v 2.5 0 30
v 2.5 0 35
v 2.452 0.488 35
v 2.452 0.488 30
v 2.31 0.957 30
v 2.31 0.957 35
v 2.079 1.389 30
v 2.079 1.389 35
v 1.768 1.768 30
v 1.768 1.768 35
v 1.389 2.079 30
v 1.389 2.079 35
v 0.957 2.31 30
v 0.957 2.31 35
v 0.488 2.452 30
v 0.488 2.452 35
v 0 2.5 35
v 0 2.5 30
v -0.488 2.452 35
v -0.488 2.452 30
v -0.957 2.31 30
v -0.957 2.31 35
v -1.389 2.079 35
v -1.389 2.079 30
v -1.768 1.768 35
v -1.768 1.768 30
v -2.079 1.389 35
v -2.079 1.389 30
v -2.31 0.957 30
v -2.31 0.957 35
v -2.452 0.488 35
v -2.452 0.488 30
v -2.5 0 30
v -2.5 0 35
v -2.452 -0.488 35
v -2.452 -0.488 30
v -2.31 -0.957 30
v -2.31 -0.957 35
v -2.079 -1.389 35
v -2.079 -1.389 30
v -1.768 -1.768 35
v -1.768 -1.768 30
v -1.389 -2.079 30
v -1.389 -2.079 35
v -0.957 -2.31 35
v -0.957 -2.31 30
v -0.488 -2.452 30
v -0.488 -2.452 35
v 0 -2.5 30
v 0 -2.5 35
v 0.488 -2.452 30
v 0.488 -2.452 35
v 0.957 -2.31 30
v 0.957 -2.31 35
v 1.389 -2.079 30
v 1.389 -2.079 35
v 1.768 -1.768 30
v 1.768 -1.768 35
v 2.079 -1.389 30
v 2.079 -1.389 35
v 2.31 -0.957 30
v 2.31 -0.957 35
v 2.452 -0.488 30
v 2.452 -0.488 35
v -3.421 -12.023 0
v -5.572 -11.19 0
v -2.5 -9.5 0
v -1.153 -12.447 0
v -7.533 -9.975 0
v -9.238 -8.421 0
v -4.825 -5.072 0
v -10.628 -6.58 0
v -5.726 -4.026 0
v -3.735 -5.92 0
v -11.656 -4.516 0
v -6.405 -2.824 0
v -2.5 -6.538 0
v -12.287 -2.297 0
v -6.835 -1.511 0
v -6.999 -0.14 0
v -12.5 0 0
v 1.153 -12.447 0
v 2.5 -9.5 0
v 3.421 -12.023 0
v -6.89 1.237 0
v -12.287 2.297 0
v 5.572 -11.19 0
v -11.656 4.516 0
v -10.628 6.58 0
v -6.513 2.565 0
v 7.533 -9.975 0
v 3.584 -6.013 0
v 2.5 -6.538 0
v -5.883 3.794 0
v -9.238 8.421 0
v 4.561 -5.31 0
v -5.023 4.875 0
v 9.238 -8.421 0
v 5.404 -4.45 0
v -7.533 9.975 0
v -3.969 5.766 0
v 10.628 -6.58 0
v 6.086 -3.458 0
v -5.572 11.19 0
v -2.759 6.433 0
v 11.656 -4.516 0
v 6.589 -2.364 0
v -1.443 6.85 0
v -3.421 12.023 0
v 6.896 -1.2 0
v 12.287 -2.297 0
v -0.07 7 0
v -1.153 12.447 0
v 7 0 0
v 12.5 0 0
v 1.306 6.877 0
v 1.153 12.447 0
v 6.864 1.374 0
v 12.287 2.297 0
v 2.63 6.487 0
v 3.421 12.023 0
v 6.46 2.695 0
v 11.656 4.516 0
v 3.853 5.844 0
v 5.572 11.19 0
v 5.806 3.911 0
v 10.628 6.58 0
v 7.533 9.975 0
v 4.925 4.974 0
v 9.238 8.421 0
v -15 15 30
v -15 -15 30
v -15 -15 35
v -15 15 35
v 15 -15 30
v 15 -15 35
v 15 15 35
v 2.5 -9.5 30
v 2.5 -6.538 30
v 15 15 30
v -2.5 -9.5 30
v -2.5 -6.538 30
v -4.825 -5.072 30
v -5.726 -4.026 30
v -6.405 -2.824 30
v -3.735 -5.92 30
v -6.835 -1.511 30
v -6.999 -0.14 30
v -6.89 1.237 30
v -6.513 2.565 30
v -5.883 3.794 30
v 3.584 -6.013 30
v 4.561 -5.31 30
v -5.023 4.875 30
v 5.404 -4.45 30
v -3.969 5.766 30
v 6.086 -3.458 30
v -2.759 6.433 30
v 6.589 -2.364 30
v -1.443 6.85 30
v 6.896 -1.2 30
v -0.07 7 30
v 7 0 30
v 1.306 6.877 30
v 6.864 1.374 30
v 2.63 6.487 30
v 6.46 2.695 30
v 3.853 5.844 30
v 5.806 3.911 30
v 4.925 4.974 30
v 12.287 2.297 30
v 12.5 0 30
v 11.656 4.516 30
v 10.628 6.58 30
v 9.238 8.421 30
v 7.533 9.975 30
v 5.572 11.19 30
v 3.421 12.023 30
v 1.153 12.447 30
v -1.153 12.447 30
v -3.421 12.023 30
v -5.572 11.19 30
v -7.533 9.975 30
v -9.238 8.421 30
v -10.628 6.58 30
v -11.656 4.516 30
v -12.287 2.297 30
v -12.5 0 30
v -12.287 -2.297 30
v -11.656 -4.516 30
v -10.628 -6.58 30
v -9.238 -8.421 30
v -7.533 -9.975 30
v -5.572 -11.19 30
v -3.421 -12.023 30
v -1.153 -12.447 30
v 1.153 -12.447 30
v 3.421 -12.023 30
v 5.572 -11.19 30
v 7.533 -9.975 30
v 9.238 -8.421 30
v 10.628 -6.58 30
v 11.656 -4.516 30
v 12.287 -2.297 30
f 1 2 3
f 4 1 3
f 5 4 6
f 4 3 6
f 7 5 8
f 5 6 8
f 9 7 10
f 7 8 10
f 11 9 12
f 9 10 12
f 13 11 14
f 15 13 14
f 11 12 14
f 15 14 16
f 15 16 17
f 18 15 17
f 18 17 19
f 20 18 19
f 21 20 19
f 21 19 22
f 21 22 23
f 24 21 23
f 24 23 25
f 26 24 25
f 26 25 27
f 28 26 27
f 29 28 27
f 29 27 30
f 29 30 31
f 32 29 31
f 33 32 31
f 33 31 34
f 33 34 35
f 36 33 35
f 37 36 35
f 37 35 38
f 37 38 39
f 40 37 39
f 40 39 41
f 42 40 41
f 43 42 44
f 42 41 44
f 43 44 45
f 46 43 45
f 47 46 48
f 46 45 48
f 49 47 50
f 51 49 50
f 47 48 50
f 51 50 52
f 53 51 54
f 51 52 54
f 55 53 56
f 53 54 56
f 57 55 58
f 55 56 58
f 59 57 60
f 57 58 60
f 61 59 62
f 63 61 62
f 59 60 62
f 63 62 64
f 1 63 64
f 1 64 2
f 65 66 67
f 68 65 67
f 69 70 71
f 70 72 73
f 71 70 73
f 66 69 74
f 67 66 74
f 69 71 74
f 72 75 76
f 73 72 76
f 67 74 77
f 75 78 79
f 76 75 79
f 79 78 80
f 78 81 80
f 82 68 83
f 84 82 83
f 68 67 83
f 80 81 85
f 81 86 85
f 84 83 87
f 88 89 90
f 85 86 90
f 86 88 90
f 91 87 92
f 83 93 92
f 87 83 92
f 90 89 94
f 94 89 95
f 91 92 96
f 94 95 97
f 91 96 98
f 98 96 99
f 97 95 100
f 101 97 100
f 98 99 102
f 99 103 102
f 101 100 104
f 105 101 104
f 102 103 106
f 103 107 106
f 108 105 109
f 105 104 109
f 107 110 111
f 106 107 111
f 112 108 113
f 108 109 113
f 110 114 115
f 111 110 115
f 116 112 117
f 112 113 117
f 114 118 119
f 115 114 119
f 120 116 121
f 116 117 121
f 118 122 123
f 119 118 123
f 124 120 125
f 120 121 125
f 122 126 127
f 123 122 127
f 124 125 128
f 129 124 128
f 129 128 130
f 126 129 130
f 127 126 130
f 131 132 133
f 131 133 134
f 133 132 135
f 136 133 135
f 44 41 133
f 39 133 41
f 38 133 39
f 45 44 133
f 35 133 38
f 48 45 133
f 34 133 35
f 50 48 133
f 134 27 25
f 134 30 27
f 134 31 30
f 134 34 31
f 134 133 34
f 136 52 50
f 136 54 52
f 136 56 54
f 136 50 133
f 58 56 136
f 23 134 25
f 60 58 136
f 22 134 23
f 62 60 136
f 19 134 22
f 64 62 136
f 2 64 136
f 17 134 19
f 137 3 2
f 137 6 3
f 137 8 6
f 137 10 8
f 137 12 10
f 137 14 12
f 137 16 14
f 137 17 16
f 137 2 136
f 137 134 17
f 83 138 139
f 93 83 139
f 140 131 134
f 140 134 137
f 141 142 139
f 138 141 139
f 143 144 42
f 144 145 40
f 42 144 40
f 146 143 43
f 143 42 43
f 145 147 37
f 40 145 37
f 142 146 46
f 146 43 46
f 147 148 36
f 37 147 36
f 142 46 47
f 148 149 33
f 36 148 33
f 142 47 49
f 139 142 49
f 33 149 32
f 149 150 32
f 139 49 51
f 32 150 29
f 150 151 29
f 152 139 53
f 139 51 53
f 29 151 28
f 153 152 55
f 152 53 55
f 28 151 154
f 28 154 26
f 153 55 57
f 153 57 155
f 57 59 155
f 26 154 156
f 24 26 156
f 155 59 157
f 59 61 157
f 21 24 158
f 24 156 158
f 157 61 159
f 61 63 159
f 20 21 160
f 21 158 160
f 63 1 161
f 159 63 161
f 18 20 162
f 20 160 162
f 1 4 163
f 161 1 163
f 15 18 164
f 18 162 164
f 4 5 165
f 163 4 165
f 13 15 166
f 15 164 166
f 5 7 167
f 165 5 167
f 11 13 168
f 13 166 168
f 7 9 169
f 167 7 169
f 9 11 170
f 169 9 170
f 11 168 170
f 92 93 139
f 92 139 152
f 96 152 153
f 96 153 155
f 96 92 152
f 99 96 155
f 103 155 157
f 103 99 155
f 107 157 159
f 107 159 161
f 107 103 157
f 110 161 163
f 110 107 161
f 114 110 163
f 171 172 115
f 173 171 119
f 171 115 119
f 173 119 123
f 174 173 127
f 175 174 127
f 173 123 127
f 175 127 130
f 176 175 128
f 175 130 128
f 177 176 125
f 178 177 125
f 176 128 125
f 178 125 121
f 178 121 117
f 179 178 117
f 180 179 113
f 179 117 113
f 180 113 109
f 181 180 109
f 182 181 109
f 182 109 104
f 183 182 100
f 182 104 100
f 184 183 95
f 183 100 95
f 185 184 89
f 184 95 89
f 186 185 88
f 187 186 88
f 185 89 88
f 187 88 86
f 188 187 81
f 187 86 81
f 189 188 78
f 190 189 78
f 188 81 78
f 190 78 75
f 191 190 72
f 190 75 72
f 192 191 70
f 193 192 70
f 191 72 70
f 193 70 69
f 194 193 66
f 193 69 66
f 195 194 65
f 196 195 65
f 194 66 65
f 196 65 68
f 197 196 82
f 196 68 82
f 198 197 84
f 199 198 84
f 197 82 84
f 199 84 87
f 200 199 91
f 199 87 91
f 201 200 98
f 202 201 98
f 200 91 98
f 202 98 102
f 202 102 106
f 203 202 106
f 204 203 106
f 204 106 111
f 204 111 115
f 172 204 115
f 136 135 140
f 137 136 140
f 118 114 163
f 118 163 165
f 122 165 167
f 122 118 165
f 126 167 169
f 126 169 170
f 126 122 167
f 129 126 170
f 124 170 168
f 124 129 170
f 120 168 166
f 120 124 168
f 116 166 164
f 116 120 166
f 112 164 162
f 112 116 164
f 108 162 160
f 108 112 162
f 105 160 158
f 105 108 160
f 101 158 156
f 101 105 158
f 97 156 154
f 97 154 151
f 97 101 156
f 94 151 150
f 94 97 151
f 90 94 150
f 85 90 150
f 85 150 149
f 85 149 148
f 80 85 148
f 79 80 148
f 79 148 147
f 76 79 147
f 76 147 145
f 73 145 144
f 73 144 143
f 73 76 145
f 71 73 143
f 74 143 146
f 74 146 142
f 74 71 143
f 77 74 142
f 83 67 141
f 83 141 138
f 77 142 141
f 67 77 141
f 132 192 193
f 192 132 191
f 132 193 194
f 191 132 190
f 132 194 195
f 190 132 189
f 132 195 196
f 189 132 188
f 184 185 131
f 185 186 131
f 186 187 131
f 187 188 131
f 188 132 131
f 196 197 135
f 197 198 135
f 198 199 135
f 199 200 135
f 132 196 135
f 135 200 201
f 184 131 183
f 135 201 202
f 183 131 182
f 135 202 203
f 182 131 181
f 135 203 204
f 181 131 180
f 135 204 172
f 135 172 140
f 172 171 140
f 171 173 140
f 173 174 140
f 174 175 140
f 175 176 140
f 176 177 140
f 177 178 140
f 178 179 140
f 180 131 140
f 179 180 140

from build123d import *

# Parameters (mm, degrees)
F0_W     = 30
F0_H     = 30
F1_DEPTH = 35
F2_DEPTH = 30
F3_R     = 2.5
F4_DEPTH = 35.001
F5_W     = 30
F5_H     = 30
F5_R     = 12.5
F6_DEPTH = 30


with BuildPart() as f1:
    # F0 (on Top) → F1 (new body)
    with BuildSketch(Plane.XY):
        Rectangle(F0_W, F0_H)
        with BuildLine():
            ThreePointArc((-2.5, -6.5383484153), (-3.9686269666, 5.7662812973), (7, 0))
            ThreePointArc((7, 0), (5.7662812973, -3.9686269666), (2.5, -6.5383484153))
            Line((2.5, -6.5383484153), (2.5, -9.5))
            Line((2.5, -9.5), (0, -9.5))
            Line((0, -9.5), (-2.5, -9.5))
            Line((-2.5, -9.5), (-2.5, -6.5383484153))
        make_face(mode=Mode.SUBTRACT)
        with BuildLine():
            ThreePointArc((2.5, -6.5383484153), (5.7662812973, -3.9686269666), (7, 0))
            ThreePointArc((7, 0), (-3.9686269666, 5.7662812973), (-2.5, -6.5383484153))
            ThreePointArc((-2.5, -6.5383484153), (0, -7), (2.5, -6.5383484153))
        make_face()
        with BuildLine():
            ThreePointArc((2.5, -6.5383484153), (0, -7), (-2.5, -6.5383484153))
            Line((-2.5, -6.5383484153), (-2.5, -9.5))
            Line((-2.5, -9.5), (0, -9.5))
            Line((0, -9.5), (2.5, -9.5))
            Line((2.5, -9.5), (2.5, -6.5383484153))
        make_face()
    extrude(amount=F1_DEPTH)

    # F0 (on Top) → F2 (cut)
    with BuildSketch(Plane.XY):
        with BuildLine():
            ThreePointArc((2.5, -6.5383484153), (5.7662812973, -3.9686269666), (7, 0))
            ThreePointArc((7, 0), (-3.9686269666, 5.7662812973), (-2.5, -6.5383484153))
            ThreePointArc((-2.5, -6.5383484153), (0, -7), (2.5, -6.5383484153))
        make_face()
        with BuildLine():
            ThreePointArc((2.5, -6.5383484153), (0, -7), (-2.5, -6.5383484153))
            Line((-2.5, -6.5383484153), (-2.5, -9.5))
            Line((-2.5, -9.5), (0, -9.5))
            Line((0, -9.5), (2.5, -9.5))
            Line((2.5, -9.5), (2.5, -6.5383484153))
        make_face()
    extrude(amount=F2_DEPTH, mode=Mode.SUBTRACT)

    # F3 (on face) → F4 (cut, through all)
    with BuildSketch(Plane.XY.offset(35)):
        Circle(F3_R)
    extrude(amount=-F4_DEPTH, mode=Mode.SUBTRACT)

    # F5 (on face) → F6 (cut)
    with BuildSketch(Plane.XY):
        Rectangle(F5_W, F5_H)
        Circle(F5_R, mode=Mode.SUBTRACT)
    extrude(amount=F6_DEPTH, mode=Mode.SUBTRACT)


solid = f1.part
